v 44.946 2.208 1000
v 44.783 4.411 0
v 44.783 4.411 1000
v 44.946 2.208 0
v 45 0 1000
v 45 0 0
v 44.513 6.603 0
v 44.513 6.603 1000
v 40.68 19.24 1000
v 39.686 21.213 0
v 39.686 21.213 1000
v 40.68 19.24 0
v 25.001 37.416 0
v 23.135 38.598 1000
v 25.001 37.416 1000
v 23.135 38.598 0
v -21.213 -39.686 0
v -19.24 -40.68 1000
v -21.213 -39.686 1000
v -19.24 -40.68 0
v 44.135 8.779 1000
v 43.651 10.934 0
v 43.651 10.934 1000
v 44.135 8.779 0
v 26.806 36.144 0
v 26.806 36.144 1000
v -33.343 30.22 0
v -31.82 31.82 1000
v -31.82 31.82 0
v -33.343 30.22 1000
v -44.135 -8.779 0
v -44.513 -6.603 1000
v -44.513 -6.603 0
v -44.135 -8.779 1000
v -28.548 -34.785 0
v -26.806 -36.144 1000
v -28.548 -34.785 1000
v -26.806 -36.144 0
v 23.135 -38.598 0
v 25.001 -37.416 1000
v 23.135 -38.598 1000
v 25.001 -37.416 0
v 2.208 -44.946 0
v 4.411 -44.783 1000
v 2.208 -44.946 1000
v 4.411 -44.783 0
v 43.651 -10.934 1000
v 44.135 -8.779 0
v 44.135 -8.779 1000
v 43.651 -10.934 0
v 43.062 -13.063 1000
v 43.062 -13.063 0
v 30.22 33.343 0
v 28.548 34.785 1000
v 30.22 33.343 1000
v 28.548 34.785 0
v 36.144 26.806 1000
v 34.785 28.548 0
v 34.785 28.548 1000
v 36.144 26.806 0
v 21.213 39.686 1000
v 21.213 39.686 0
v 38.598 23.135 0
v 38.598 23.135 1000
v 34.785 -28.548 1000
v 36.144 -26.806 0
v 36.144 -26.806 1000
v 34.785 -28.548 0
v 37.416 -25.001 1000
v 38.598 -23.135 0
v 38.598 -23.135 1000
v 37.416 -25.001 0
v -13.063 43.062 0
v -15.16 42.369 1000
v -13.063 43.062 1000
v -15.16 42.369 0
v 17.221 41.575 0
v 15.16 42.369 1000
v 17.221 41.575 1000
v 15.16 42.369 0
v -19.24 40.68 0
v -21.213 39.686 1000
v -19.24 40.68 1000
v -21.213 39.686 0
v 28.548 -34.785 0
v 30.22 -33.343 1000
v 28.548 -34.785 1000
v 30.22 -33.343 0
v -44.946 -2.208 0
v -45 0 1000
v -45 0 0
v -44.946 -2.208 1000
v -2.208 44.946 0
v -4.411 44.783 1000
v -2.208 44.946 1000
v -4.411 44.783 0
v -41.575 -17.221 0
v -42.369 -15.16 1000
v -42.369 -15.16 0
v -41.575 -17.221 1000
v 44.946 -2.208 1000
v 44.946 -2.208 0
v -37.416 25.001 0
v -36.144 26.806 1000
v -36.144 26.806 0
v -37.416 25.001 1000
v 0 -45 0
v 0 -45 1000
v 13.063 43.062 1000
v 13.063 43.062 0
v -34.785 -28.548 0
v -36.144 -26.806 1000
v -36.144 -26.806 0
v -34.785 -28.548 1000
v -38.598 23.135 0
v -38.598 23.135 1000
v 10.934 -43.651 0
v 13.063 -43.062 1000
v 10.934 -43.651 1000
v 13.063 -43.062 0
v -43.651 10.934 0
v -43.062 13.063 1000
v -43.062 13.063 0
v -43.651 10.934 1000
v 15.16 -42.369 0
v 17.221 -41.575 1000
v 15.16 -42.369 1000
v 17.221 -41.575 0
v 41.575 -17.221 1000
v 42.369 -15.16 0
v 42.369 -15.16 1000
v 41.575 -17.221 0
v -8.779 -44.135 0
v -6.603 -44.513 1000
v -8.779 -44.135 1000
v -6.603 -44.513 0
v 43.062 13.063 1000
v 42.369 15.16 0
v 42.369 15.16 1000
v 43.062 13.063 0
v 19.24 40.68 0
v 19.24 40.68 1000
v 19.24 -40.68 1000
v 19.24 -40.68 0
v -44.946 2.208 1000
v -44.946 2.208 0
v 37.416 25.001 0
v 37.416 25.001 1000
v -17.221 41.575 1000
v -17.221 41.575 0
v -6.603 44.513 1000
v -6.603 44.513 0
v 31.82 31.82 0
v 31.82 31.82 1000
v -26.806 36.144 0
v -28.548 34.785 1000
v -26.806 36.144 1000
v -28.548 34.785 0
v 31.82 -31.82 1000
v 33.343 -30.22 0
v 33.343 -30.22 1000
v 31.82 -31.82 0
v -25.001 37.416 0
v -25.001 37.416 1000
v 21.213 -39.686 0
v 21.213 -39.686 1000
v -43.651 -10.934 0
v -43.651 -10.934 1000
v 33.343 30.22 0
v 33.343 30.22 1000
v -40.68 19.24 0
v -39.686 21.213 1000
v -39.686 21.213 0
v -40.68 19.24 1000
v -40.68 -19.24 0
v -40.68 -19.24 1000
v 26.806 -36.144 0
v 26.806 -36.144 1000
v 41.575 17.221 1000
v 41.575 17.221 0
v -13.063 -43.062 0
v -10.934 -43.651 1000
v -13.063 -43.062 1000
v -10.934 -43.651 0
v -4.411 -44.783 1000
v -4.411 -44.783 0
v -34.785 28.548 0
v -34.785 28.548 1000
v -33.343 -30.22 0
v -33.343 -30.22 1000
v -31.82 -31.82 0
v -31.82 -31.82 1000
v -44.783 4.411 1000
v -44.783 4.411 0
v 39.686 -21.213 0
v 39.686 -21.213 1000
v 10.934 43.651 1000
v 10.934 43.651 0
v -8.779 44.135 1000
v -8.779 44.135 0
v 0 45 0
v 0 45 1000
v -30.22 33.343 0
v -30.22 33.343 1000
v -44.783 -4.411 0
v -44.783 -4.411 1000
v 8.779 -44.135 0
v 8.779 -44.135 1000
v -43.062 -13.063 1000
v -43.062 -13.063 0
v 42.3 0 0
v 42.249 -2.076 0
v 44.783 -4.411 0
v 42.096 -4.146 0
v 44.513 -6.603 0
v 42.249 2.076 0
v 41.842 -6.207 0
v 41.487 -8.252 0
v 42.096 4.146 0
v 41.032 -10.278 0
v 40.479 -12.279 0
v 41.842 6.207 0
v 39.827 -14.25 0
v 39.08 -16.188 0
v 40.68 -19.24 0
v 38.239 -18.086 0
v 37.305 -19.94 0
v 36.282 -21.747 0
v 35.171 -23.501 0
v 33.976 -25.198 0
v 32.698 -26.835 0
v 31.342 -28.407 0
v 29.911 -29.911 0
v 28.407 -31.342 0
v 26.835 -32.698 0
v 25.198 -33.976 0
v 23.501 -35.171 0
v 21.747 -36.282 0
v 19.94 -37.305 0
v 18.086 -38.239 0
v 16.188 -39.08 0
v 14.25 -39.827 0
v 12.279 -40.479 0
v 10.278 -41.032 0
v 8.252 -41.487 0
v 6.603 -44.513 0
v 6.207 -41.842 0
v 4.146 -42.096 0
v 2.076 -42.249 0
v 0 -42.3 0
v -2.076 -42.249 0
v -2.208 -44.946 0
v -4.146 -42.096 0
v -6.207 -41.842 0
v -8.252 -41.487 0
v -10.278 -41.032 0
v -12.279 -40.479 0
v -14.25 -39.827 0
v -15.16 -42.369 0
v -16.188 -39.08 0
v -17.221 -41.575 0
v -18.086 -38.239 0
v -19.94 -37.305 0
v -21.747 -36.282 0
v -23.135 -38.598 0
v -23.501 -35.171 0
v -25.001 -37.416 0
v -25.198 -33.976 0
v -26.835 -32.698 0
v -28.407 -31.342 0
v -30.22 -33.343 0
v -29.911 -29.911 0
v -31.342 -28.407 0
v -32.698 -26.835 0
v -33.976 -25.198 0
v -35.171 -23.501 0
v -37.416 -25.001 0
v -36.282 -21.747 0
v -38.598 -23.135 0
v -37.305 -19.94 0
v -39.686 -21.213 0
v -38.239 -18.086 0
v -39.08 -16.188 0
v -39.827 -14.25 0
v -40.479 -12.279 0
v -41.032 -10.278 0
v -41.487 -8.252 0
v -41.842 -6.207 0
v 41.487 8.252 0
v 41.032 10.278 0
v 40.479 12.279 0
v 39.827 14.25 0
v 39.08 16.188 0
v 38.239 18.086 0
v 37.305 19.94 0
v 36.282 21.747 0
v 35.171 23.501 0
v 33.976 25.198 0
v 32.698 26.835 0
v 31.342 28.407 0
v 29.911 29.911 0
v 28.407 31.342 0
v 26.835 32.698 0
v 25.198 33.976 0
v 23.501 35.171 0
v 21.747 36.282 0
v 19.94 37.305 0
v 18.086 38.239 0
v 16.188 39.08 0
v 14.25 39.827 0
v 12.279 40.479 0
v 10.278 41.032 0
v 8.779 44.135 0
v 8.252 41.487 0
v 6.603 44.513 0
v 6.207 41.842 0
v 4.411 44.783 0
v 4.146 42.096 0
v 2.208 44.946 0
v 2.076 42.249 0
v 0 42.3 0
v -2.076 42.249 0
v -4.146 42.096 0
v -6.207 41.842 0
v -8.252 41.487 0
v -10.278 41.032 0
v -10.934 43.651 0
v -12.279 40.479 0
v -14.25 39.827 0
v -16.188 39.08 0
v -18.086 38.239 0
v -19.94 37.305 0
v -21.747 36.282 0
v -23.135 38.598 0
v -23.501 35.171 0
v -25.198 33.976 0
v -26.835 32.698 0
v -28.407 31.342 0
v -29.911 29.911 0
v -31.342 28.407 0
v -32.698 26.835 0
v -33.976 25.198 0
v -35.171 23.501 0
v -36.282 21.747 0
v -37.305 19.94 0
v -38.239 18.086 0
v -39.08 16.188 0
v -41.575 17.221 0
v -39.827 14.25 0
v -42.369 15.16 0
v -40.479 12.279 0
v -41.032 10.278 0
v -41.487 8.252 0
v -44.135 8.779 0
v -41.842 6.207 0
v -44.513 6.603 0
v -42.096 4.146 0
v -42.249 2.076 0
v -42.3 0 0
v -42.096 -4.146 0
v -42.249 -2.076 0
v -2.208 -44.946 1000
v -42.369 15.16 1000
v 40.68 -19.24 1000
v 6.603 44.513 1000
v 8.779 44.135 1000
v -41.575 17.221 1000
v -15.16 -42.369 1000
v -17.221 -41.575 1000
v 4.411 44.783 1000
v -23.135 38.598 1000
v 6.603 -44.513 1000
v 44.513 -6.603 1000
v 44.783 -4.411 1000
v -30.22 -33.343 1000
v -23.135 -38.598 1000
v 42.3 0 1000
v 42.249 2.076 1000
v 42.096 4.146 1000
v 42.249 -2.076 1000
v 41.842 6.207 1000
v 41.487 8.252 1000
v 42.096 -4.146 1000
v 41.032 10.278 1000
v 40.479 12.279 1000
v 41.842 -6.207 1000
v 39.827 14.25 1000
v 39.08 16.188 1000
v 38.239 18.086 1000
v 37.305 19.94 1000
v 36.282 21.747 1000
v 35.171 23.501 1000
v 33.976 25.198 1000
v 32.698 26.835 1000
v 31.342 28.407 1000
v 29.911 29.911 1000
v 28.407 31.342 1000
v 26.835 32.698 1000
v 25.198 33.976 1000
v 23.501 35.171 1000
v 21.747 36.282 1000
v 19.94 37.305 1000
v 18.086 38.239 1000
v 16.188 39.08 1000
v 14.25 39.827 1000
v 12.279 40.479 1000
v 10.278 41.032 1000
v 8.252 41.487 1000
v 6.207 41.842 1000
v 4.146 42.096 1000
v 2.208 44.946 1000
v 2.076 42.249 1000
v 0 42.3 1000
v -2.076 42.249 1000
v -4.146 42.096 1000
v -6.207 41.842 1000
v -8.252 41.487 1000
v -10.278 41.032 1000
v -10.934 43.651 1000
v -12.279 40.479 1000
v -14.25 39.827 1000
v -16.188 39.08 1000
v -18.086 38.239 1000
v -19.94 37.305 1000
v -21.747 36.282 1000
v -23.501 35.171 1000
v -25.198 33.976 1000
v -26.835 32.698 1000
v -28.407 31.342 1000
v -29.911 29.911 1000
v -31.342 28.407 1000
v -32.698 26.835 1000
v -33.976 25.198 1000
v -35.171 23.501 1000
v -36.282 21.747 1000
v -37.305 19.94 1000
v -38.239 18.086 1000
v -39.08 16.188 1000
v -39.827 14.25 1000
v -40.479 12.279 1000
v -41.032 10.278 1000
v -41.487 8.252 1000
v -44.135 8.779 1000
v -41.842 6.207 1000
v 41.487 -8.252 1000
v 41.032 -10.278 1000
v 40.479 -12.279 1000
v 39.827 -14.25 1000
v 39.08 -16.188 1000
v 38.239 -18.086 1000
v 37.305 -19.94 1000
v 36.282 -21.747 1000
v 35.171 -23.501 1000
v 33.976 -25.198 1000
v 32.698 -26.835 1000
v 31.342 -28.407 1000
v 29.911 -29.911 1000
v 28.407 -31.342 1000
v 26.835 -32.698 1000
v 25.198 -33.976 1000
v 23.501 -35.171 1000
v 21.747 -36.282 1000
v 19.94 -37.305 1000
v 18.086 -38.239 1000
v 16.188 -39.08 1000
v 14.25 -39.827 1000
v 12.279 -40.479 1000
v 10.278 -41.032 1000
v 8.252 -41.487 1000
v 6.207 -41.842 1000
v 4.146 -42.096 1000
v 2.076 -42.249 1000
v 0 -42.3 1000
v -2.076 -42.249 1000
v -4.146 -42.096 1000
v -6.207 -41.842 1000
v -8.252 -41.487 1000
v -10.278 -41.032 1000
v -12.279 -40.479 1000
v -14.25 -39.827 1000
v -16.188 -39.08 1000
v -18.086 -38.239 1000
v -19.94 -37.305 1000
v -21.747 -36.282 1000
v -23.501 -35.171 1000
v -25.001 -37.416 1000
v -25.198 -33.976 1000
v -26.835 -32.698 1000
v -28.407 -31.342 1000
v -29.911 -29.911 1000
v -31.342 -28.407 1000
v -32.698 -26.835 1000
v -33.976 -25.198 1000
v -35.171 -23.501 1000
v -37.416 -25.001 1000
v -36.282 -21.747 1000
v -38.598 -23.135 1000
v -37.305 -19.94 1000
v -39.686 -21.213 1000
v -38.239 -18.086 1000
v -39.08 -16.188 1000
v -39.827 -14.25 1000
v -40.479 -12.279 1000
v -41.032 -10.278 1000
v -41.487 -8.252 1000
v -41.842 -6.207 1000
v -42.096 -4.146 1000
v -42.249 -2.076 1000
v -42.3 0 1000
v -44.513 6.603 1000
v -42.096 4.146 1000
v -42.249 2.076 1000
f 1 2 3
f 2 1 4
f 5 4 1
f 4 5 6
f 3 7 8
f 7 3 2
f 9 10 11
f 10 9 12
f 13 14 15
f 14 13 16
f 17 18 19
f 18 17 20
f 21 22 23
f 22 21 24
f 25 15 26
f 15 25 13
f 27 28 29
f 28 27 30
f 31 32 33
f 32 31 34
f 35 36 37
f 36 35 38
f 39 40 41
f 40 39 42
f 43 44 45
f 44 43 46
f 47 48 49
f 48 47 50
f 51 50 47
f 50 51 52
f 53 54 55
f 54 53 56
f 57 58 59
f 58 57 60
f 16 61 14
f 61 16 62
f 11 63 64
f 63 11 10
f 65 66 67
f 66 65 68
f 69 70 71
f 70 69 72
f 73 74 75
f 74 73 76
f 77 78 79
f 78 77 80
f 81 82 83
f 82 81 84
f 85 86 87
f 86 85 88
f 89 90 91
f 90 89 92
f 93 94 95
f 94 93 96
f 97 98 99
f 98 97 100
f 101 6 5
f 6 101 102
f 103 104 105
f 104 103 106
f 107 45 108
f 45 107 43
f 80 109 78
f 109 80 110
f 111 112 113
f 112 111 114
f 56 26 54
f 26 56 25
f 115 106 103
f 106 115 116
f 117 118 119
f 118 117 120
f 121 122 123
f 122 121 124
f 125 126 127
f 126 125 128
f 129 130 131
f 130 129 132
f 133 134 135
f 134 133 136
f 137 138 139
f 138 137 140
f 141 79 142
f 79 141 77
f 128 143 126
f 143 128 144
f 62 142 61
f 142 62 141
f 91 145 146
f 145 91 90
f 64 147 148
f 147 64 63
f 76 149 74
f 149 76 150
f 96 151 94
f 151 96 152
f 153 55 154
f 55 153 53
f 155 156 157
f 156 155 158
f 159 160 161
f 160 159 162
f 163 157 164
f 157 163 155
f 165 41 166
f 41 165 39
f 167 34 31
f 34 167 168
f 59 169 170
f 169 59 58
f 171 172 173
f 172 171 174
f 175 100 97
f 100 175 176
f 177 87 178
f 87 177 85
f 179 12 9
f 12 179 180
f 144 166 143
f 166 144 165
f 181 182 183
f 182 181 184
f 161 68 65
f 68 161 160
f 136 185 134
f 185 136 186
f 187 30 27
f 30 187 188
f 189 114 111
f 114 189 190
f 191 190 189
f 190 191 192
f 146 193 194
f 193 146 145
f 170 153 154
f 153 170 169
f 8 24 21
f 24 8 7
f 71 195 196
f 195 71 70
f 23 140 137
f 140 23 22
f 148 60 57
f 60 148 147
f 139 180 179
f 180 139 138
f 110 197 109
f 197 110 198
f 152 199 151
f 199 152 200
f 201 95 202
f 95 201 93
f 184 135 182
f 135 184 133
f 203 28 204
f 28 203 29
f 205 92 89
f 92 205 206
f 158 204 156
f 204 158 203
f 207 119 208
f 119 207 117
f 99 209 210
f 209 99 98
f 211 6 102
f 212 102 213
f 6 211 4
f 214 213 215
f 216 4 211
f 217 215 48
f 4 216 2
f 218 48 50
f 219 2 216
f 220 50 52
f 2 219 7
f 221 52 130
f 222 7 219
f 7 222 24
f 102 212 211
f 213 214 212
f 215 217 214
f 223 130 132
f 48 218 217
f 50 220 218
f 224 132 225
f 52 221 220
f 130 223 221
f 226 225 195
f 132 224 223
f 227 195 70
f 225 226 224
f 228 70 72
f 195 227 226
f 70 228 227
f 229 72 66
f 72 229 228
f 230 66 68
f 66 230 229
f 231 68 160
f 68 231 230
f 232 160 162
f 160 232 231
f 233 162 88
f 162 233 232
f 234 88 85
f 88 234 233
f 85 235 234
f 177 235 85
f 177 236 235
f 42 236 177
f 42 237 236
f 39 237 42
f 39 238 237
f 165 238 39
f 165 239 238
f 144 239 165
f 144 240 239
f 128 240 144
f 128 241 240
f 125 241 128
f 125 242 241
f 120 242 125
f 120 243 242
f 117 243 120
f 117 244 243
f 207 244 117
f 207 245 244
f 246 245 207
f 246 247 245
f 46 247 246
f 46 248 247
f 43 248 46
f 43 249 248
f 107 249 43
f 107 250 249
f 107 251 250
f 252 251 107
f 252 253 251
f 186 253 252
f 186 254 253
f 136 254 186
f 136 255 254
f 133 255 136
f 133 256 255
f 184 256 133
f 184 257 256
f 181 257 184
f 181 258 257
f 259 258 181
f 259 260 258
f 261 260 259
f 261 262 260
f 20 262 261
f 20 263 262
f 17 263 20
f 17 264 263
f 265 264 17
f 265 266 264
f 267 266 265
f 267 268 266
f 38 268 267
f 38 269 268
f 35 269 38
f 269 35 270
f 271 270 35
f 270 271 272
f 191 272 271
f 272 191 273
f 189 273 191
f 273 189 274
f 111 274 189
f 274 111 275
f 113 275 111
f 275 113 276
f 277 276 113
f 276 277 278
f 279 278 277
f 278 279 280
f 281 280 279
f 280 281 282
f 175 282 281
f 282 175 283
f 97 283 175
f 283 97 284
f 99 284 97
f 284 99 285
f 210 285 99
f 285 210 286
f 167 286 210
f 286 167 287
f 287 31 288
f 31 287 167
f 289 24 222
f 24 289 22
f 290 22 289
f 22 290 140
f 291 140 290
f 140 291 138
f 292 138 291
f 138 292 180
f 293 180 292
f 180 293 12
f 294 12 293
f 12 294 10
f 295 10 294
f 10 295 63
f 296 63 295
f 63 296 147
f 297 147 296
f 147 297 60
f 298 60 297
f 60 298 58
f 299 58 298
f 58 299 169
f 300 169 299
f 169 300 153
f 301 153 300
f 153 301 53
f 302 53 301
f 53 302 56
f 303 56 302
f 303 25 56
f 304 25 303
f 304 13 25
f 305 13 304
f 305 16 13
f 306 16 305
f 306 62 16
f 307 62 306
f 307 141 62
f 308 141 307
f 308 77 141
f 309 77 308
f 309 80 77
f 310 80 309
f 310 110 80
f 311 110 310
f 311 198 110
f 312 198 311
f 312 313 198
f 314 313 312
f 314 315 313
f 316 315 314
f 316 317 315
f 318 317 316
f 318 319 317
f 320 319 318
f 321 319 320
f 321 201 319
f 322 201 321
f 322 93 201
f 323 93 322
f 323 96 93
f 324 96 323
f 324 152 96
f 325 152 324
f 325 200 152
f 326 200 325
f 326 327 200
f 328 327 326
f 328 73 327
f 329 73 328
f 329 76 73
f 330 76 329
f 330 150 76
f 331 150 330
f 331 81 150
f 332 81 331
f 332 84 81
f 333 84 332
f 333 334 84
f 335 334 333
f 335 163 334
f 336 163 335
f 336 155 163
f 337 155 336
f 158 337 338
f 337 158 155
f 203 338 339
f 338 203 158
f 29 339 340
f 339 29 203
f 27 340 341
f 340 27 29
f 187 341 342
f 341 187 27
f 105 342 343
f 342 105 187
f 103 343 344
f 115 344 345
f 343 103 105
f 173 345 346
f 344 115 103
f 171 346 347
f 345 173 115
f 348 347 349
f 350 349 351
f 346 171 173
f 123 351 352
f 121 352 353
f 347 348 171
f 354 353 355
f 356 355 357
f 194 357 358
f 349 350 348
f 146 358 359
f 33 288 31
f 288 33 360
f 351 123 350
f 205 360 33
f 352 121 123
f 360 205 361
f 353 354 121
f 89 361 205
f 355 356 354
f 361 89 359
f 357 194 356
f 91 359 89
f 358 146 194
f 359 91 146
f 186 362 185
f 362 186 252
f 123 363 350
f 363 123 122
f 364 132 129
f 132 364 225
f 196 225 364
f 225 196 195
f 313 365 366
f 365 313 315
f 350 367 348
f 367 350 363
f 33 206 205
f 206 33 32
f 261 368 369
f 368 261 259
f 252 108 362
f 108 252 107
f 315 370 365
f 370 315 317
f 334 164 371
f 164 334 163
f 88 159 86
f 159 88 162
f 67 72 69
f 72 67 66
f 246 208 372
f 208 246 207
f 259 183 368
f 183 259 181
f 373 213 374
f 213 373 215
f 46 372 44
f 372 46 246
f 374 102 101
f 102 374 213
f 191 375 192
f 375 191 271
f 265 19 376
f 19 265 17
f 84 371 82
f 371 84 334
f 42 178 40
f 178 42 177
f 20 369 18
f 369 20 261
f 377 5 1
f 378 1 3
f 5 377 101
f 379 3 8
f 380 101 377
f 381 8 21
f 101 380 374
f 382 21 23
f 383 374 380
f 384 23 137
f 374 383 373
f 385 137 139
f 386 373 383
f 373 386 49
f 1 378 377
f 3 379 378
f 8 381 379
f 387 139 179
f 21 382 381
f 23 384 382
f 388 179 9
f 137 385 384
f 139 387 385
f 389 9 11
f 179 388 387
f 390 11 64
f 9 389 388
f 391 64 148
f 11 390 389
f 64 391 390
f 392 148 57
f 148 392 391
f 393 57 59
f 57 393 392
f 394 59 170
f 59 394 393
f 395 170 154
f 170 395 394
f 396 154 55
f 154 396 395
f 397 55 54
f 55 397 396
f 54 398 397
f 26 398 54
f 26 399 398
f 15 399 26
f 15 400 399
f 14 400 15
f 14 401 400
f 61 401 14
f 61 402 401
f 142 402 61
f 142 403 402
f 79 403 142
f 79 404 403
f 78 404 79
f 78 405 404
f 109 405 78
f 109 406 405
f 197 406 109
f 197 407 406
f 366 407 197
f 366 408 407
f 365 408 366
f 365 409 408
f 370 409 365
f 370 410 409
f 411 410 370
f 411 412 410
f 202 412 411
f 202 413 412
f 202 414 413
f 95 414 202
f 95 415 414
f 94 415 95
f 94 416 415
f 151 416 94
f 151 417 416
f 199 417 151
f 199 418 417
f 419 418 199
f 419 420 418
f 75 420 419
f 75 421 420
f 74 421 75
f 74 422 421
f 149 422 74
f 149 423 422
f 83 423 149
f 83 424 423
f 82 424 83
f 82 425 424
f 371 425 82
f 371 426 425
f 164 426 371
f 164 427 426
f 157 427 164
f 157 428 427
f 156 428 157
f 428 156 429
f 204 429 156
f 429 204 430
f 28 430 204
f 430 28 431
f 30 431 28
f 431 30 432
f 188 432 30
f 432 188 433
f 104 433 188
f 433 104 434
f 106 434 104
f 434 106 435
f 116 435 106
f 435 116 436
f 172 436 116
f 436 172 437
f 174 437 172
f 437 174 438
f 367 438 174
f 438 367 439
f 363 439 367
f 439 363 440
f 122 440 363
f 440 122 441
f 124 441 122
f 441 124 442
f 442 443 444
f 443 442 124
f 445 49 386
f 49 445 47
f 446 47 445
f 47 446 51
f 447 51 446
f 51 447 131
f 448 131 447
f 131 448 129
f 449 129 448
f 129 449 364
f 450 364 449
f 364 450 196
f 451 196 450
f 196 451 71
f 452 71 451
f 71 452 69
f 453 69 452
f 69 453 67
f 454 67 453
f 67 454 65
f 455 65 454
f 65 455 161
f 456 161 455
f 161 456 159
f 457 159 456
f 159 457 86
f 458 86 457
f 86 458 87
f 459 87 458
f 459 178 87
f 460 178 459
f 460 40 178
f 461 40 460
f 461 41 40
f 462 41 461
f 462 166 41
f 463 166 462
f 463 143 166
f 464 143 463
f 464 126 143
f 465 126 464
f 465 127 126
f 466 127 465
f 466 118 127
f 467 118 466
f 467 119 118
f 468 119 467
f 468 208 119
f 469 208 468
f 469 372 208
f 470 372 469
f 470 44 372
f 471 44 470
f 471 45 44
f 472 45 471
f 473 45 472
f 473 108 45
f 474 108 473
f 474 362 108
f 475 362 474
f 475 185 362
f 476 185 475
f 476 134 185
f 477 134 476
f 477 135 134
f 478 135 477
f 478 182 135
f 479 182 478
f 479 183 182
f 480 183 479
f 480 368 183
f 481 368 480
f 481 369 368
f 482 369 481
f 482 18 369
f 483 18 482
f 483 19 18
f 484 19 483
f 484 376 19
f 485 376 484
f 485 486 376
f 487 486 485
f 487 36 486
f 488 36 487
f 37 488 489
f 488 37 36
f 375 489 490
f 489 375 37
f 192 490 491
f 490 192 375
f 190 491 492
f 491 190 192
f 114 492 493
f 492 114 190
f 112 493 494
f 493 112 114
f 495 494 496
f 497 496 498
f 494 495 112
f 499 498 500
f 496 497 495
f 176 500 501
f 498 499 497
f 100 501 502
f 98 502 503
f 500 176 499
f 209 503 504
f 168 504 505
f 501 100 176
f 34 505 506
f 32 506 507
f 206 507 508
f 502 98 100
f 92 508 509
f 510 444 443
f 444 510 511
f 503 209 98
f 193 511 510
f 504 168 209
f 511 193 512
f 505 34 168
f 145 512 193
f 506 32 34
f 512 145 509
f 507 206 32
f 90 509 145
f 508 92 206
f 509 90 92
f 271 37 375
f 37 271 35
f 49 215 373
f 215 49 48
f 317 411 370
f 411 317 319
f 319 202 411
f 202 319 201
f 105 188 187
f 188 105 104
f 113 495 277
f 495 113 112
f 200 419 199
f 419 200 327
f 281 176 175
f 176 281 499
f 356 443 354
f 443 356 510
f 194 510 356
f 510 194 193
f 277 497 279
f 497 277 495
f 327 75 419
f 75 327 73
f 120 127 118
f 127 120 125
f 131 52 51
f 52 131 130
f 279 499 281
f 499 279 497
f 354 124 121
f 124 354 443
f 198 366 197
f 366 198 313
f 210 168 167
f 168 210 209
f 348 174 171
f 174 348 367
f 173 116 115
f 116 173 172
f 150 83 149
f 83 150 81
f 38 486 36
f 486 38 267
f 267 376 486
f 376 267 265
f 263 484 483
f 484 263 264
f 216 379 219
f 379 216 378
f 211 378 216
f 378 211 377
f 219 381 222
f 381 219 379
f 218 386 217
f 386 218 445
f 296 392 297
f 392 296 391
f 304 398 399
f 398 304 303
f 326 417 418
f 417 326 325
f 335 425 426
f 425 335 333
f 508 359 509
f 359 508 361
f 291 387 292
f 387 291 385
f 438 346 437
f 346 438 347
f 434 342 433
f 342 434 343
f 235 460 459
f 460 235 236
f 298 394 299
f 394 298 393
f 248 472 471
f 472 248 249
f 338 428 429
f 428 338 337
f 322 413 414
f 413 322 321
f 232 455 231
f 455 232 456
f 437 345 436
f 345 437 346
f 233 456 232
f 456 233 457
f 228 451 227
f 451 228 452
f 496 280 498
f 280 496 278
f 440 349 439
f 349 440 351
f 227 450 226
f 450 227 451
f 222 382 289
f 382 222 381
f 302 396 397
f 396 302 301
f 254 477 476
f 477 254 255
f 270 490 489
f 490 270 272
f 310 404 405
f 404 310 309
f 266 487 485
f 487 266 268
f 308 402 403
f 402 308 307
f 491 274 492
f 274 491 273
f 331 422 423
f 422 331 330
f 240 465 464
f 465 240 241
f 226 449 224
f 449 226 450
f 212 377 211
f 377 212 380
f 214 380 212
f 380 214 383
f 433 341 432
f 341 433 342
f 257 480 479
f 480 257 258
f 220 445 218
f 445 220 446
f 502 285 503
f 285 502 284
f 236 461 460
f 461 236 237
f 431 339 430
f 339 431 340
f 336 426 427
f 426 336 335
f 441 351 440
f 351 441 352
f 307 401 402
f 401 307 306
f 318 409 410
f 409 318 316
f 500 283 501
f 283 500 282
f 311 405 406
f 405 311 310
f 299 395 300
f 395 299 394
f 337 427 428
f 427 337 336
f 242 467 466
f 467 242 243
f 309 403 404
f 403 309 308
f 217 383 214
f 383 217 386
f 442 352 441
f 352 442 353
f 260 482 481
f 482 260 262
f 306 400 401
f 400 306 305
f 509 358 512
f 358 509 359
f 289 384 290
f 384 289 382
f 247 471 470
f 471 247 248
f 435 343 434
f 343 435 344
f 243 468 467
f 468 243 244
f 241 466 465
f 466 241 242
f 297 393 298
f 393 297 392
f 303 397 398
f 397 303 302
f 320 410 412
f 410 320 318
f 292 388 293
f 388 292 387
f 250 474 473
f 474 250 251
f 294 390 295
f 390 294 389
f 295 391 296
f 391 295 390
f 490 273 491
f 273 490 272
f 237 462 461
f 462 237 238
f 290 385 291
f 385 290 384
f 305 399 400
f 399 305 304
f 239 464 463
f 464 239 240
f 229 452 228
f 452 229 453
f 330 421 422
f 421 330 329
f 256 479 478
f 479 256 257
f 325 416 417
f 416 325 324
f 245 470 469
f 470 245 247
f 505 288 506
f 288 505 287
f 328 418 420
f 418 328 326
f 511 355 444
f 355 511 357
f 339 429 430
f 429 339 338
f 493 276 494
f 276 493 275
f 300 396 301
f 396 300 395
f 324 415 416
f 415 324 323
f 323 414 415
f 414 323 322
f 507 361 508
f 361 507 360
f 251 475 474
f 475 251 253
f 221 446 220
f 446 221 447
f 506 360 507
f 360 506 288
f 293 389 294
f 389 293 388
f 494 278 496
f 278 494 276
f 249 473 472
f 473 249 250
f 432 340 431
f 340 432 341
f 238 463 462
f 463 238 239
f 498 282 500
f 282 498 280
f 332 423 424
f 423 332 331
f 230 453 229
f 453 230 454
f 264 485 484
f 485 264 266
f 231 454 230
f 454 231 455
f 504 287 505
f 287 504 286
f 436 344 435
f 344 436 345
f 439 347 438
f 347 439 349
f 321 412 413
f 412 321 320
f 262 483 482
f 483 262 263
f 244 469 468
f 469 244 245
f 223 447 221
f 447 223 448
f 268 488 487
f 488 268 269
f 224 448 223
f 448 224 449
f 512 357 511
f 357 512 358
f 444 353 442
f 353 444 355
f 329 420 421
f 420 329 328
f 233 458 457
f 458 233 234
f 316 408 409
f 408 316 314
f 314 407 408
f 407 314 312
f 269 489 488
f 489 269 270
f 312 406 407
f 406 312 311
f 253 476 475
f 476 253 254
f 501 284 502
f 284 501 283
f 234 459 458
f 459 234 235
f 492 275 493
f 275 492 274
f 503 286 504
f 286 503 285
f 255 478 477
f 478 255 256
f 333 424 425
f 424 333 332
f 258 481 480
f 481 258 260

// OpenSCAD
$fn = 128;

// HT 90 pipe 1000 mm (approximation)
// Assumptions (typical HT DN90):
// - Outer diameter: 90 mm
// - Wall thickness: 2.7 mm
// - Length: 1000 mm

length = 1000;
od = 90;
wall = 2.7;
id = od - 2*wall;

module ht_pipe(len=1000, outer_d=90, inner_d=84.6) {
    difference() {
        cylinder(h=len, d=outer_d, center=false);
        translate([0,0,-0.5])
            cylinder(h=len+1, d=inner_d, center=false);
    }
}

ht_pipe(length, od, id);
